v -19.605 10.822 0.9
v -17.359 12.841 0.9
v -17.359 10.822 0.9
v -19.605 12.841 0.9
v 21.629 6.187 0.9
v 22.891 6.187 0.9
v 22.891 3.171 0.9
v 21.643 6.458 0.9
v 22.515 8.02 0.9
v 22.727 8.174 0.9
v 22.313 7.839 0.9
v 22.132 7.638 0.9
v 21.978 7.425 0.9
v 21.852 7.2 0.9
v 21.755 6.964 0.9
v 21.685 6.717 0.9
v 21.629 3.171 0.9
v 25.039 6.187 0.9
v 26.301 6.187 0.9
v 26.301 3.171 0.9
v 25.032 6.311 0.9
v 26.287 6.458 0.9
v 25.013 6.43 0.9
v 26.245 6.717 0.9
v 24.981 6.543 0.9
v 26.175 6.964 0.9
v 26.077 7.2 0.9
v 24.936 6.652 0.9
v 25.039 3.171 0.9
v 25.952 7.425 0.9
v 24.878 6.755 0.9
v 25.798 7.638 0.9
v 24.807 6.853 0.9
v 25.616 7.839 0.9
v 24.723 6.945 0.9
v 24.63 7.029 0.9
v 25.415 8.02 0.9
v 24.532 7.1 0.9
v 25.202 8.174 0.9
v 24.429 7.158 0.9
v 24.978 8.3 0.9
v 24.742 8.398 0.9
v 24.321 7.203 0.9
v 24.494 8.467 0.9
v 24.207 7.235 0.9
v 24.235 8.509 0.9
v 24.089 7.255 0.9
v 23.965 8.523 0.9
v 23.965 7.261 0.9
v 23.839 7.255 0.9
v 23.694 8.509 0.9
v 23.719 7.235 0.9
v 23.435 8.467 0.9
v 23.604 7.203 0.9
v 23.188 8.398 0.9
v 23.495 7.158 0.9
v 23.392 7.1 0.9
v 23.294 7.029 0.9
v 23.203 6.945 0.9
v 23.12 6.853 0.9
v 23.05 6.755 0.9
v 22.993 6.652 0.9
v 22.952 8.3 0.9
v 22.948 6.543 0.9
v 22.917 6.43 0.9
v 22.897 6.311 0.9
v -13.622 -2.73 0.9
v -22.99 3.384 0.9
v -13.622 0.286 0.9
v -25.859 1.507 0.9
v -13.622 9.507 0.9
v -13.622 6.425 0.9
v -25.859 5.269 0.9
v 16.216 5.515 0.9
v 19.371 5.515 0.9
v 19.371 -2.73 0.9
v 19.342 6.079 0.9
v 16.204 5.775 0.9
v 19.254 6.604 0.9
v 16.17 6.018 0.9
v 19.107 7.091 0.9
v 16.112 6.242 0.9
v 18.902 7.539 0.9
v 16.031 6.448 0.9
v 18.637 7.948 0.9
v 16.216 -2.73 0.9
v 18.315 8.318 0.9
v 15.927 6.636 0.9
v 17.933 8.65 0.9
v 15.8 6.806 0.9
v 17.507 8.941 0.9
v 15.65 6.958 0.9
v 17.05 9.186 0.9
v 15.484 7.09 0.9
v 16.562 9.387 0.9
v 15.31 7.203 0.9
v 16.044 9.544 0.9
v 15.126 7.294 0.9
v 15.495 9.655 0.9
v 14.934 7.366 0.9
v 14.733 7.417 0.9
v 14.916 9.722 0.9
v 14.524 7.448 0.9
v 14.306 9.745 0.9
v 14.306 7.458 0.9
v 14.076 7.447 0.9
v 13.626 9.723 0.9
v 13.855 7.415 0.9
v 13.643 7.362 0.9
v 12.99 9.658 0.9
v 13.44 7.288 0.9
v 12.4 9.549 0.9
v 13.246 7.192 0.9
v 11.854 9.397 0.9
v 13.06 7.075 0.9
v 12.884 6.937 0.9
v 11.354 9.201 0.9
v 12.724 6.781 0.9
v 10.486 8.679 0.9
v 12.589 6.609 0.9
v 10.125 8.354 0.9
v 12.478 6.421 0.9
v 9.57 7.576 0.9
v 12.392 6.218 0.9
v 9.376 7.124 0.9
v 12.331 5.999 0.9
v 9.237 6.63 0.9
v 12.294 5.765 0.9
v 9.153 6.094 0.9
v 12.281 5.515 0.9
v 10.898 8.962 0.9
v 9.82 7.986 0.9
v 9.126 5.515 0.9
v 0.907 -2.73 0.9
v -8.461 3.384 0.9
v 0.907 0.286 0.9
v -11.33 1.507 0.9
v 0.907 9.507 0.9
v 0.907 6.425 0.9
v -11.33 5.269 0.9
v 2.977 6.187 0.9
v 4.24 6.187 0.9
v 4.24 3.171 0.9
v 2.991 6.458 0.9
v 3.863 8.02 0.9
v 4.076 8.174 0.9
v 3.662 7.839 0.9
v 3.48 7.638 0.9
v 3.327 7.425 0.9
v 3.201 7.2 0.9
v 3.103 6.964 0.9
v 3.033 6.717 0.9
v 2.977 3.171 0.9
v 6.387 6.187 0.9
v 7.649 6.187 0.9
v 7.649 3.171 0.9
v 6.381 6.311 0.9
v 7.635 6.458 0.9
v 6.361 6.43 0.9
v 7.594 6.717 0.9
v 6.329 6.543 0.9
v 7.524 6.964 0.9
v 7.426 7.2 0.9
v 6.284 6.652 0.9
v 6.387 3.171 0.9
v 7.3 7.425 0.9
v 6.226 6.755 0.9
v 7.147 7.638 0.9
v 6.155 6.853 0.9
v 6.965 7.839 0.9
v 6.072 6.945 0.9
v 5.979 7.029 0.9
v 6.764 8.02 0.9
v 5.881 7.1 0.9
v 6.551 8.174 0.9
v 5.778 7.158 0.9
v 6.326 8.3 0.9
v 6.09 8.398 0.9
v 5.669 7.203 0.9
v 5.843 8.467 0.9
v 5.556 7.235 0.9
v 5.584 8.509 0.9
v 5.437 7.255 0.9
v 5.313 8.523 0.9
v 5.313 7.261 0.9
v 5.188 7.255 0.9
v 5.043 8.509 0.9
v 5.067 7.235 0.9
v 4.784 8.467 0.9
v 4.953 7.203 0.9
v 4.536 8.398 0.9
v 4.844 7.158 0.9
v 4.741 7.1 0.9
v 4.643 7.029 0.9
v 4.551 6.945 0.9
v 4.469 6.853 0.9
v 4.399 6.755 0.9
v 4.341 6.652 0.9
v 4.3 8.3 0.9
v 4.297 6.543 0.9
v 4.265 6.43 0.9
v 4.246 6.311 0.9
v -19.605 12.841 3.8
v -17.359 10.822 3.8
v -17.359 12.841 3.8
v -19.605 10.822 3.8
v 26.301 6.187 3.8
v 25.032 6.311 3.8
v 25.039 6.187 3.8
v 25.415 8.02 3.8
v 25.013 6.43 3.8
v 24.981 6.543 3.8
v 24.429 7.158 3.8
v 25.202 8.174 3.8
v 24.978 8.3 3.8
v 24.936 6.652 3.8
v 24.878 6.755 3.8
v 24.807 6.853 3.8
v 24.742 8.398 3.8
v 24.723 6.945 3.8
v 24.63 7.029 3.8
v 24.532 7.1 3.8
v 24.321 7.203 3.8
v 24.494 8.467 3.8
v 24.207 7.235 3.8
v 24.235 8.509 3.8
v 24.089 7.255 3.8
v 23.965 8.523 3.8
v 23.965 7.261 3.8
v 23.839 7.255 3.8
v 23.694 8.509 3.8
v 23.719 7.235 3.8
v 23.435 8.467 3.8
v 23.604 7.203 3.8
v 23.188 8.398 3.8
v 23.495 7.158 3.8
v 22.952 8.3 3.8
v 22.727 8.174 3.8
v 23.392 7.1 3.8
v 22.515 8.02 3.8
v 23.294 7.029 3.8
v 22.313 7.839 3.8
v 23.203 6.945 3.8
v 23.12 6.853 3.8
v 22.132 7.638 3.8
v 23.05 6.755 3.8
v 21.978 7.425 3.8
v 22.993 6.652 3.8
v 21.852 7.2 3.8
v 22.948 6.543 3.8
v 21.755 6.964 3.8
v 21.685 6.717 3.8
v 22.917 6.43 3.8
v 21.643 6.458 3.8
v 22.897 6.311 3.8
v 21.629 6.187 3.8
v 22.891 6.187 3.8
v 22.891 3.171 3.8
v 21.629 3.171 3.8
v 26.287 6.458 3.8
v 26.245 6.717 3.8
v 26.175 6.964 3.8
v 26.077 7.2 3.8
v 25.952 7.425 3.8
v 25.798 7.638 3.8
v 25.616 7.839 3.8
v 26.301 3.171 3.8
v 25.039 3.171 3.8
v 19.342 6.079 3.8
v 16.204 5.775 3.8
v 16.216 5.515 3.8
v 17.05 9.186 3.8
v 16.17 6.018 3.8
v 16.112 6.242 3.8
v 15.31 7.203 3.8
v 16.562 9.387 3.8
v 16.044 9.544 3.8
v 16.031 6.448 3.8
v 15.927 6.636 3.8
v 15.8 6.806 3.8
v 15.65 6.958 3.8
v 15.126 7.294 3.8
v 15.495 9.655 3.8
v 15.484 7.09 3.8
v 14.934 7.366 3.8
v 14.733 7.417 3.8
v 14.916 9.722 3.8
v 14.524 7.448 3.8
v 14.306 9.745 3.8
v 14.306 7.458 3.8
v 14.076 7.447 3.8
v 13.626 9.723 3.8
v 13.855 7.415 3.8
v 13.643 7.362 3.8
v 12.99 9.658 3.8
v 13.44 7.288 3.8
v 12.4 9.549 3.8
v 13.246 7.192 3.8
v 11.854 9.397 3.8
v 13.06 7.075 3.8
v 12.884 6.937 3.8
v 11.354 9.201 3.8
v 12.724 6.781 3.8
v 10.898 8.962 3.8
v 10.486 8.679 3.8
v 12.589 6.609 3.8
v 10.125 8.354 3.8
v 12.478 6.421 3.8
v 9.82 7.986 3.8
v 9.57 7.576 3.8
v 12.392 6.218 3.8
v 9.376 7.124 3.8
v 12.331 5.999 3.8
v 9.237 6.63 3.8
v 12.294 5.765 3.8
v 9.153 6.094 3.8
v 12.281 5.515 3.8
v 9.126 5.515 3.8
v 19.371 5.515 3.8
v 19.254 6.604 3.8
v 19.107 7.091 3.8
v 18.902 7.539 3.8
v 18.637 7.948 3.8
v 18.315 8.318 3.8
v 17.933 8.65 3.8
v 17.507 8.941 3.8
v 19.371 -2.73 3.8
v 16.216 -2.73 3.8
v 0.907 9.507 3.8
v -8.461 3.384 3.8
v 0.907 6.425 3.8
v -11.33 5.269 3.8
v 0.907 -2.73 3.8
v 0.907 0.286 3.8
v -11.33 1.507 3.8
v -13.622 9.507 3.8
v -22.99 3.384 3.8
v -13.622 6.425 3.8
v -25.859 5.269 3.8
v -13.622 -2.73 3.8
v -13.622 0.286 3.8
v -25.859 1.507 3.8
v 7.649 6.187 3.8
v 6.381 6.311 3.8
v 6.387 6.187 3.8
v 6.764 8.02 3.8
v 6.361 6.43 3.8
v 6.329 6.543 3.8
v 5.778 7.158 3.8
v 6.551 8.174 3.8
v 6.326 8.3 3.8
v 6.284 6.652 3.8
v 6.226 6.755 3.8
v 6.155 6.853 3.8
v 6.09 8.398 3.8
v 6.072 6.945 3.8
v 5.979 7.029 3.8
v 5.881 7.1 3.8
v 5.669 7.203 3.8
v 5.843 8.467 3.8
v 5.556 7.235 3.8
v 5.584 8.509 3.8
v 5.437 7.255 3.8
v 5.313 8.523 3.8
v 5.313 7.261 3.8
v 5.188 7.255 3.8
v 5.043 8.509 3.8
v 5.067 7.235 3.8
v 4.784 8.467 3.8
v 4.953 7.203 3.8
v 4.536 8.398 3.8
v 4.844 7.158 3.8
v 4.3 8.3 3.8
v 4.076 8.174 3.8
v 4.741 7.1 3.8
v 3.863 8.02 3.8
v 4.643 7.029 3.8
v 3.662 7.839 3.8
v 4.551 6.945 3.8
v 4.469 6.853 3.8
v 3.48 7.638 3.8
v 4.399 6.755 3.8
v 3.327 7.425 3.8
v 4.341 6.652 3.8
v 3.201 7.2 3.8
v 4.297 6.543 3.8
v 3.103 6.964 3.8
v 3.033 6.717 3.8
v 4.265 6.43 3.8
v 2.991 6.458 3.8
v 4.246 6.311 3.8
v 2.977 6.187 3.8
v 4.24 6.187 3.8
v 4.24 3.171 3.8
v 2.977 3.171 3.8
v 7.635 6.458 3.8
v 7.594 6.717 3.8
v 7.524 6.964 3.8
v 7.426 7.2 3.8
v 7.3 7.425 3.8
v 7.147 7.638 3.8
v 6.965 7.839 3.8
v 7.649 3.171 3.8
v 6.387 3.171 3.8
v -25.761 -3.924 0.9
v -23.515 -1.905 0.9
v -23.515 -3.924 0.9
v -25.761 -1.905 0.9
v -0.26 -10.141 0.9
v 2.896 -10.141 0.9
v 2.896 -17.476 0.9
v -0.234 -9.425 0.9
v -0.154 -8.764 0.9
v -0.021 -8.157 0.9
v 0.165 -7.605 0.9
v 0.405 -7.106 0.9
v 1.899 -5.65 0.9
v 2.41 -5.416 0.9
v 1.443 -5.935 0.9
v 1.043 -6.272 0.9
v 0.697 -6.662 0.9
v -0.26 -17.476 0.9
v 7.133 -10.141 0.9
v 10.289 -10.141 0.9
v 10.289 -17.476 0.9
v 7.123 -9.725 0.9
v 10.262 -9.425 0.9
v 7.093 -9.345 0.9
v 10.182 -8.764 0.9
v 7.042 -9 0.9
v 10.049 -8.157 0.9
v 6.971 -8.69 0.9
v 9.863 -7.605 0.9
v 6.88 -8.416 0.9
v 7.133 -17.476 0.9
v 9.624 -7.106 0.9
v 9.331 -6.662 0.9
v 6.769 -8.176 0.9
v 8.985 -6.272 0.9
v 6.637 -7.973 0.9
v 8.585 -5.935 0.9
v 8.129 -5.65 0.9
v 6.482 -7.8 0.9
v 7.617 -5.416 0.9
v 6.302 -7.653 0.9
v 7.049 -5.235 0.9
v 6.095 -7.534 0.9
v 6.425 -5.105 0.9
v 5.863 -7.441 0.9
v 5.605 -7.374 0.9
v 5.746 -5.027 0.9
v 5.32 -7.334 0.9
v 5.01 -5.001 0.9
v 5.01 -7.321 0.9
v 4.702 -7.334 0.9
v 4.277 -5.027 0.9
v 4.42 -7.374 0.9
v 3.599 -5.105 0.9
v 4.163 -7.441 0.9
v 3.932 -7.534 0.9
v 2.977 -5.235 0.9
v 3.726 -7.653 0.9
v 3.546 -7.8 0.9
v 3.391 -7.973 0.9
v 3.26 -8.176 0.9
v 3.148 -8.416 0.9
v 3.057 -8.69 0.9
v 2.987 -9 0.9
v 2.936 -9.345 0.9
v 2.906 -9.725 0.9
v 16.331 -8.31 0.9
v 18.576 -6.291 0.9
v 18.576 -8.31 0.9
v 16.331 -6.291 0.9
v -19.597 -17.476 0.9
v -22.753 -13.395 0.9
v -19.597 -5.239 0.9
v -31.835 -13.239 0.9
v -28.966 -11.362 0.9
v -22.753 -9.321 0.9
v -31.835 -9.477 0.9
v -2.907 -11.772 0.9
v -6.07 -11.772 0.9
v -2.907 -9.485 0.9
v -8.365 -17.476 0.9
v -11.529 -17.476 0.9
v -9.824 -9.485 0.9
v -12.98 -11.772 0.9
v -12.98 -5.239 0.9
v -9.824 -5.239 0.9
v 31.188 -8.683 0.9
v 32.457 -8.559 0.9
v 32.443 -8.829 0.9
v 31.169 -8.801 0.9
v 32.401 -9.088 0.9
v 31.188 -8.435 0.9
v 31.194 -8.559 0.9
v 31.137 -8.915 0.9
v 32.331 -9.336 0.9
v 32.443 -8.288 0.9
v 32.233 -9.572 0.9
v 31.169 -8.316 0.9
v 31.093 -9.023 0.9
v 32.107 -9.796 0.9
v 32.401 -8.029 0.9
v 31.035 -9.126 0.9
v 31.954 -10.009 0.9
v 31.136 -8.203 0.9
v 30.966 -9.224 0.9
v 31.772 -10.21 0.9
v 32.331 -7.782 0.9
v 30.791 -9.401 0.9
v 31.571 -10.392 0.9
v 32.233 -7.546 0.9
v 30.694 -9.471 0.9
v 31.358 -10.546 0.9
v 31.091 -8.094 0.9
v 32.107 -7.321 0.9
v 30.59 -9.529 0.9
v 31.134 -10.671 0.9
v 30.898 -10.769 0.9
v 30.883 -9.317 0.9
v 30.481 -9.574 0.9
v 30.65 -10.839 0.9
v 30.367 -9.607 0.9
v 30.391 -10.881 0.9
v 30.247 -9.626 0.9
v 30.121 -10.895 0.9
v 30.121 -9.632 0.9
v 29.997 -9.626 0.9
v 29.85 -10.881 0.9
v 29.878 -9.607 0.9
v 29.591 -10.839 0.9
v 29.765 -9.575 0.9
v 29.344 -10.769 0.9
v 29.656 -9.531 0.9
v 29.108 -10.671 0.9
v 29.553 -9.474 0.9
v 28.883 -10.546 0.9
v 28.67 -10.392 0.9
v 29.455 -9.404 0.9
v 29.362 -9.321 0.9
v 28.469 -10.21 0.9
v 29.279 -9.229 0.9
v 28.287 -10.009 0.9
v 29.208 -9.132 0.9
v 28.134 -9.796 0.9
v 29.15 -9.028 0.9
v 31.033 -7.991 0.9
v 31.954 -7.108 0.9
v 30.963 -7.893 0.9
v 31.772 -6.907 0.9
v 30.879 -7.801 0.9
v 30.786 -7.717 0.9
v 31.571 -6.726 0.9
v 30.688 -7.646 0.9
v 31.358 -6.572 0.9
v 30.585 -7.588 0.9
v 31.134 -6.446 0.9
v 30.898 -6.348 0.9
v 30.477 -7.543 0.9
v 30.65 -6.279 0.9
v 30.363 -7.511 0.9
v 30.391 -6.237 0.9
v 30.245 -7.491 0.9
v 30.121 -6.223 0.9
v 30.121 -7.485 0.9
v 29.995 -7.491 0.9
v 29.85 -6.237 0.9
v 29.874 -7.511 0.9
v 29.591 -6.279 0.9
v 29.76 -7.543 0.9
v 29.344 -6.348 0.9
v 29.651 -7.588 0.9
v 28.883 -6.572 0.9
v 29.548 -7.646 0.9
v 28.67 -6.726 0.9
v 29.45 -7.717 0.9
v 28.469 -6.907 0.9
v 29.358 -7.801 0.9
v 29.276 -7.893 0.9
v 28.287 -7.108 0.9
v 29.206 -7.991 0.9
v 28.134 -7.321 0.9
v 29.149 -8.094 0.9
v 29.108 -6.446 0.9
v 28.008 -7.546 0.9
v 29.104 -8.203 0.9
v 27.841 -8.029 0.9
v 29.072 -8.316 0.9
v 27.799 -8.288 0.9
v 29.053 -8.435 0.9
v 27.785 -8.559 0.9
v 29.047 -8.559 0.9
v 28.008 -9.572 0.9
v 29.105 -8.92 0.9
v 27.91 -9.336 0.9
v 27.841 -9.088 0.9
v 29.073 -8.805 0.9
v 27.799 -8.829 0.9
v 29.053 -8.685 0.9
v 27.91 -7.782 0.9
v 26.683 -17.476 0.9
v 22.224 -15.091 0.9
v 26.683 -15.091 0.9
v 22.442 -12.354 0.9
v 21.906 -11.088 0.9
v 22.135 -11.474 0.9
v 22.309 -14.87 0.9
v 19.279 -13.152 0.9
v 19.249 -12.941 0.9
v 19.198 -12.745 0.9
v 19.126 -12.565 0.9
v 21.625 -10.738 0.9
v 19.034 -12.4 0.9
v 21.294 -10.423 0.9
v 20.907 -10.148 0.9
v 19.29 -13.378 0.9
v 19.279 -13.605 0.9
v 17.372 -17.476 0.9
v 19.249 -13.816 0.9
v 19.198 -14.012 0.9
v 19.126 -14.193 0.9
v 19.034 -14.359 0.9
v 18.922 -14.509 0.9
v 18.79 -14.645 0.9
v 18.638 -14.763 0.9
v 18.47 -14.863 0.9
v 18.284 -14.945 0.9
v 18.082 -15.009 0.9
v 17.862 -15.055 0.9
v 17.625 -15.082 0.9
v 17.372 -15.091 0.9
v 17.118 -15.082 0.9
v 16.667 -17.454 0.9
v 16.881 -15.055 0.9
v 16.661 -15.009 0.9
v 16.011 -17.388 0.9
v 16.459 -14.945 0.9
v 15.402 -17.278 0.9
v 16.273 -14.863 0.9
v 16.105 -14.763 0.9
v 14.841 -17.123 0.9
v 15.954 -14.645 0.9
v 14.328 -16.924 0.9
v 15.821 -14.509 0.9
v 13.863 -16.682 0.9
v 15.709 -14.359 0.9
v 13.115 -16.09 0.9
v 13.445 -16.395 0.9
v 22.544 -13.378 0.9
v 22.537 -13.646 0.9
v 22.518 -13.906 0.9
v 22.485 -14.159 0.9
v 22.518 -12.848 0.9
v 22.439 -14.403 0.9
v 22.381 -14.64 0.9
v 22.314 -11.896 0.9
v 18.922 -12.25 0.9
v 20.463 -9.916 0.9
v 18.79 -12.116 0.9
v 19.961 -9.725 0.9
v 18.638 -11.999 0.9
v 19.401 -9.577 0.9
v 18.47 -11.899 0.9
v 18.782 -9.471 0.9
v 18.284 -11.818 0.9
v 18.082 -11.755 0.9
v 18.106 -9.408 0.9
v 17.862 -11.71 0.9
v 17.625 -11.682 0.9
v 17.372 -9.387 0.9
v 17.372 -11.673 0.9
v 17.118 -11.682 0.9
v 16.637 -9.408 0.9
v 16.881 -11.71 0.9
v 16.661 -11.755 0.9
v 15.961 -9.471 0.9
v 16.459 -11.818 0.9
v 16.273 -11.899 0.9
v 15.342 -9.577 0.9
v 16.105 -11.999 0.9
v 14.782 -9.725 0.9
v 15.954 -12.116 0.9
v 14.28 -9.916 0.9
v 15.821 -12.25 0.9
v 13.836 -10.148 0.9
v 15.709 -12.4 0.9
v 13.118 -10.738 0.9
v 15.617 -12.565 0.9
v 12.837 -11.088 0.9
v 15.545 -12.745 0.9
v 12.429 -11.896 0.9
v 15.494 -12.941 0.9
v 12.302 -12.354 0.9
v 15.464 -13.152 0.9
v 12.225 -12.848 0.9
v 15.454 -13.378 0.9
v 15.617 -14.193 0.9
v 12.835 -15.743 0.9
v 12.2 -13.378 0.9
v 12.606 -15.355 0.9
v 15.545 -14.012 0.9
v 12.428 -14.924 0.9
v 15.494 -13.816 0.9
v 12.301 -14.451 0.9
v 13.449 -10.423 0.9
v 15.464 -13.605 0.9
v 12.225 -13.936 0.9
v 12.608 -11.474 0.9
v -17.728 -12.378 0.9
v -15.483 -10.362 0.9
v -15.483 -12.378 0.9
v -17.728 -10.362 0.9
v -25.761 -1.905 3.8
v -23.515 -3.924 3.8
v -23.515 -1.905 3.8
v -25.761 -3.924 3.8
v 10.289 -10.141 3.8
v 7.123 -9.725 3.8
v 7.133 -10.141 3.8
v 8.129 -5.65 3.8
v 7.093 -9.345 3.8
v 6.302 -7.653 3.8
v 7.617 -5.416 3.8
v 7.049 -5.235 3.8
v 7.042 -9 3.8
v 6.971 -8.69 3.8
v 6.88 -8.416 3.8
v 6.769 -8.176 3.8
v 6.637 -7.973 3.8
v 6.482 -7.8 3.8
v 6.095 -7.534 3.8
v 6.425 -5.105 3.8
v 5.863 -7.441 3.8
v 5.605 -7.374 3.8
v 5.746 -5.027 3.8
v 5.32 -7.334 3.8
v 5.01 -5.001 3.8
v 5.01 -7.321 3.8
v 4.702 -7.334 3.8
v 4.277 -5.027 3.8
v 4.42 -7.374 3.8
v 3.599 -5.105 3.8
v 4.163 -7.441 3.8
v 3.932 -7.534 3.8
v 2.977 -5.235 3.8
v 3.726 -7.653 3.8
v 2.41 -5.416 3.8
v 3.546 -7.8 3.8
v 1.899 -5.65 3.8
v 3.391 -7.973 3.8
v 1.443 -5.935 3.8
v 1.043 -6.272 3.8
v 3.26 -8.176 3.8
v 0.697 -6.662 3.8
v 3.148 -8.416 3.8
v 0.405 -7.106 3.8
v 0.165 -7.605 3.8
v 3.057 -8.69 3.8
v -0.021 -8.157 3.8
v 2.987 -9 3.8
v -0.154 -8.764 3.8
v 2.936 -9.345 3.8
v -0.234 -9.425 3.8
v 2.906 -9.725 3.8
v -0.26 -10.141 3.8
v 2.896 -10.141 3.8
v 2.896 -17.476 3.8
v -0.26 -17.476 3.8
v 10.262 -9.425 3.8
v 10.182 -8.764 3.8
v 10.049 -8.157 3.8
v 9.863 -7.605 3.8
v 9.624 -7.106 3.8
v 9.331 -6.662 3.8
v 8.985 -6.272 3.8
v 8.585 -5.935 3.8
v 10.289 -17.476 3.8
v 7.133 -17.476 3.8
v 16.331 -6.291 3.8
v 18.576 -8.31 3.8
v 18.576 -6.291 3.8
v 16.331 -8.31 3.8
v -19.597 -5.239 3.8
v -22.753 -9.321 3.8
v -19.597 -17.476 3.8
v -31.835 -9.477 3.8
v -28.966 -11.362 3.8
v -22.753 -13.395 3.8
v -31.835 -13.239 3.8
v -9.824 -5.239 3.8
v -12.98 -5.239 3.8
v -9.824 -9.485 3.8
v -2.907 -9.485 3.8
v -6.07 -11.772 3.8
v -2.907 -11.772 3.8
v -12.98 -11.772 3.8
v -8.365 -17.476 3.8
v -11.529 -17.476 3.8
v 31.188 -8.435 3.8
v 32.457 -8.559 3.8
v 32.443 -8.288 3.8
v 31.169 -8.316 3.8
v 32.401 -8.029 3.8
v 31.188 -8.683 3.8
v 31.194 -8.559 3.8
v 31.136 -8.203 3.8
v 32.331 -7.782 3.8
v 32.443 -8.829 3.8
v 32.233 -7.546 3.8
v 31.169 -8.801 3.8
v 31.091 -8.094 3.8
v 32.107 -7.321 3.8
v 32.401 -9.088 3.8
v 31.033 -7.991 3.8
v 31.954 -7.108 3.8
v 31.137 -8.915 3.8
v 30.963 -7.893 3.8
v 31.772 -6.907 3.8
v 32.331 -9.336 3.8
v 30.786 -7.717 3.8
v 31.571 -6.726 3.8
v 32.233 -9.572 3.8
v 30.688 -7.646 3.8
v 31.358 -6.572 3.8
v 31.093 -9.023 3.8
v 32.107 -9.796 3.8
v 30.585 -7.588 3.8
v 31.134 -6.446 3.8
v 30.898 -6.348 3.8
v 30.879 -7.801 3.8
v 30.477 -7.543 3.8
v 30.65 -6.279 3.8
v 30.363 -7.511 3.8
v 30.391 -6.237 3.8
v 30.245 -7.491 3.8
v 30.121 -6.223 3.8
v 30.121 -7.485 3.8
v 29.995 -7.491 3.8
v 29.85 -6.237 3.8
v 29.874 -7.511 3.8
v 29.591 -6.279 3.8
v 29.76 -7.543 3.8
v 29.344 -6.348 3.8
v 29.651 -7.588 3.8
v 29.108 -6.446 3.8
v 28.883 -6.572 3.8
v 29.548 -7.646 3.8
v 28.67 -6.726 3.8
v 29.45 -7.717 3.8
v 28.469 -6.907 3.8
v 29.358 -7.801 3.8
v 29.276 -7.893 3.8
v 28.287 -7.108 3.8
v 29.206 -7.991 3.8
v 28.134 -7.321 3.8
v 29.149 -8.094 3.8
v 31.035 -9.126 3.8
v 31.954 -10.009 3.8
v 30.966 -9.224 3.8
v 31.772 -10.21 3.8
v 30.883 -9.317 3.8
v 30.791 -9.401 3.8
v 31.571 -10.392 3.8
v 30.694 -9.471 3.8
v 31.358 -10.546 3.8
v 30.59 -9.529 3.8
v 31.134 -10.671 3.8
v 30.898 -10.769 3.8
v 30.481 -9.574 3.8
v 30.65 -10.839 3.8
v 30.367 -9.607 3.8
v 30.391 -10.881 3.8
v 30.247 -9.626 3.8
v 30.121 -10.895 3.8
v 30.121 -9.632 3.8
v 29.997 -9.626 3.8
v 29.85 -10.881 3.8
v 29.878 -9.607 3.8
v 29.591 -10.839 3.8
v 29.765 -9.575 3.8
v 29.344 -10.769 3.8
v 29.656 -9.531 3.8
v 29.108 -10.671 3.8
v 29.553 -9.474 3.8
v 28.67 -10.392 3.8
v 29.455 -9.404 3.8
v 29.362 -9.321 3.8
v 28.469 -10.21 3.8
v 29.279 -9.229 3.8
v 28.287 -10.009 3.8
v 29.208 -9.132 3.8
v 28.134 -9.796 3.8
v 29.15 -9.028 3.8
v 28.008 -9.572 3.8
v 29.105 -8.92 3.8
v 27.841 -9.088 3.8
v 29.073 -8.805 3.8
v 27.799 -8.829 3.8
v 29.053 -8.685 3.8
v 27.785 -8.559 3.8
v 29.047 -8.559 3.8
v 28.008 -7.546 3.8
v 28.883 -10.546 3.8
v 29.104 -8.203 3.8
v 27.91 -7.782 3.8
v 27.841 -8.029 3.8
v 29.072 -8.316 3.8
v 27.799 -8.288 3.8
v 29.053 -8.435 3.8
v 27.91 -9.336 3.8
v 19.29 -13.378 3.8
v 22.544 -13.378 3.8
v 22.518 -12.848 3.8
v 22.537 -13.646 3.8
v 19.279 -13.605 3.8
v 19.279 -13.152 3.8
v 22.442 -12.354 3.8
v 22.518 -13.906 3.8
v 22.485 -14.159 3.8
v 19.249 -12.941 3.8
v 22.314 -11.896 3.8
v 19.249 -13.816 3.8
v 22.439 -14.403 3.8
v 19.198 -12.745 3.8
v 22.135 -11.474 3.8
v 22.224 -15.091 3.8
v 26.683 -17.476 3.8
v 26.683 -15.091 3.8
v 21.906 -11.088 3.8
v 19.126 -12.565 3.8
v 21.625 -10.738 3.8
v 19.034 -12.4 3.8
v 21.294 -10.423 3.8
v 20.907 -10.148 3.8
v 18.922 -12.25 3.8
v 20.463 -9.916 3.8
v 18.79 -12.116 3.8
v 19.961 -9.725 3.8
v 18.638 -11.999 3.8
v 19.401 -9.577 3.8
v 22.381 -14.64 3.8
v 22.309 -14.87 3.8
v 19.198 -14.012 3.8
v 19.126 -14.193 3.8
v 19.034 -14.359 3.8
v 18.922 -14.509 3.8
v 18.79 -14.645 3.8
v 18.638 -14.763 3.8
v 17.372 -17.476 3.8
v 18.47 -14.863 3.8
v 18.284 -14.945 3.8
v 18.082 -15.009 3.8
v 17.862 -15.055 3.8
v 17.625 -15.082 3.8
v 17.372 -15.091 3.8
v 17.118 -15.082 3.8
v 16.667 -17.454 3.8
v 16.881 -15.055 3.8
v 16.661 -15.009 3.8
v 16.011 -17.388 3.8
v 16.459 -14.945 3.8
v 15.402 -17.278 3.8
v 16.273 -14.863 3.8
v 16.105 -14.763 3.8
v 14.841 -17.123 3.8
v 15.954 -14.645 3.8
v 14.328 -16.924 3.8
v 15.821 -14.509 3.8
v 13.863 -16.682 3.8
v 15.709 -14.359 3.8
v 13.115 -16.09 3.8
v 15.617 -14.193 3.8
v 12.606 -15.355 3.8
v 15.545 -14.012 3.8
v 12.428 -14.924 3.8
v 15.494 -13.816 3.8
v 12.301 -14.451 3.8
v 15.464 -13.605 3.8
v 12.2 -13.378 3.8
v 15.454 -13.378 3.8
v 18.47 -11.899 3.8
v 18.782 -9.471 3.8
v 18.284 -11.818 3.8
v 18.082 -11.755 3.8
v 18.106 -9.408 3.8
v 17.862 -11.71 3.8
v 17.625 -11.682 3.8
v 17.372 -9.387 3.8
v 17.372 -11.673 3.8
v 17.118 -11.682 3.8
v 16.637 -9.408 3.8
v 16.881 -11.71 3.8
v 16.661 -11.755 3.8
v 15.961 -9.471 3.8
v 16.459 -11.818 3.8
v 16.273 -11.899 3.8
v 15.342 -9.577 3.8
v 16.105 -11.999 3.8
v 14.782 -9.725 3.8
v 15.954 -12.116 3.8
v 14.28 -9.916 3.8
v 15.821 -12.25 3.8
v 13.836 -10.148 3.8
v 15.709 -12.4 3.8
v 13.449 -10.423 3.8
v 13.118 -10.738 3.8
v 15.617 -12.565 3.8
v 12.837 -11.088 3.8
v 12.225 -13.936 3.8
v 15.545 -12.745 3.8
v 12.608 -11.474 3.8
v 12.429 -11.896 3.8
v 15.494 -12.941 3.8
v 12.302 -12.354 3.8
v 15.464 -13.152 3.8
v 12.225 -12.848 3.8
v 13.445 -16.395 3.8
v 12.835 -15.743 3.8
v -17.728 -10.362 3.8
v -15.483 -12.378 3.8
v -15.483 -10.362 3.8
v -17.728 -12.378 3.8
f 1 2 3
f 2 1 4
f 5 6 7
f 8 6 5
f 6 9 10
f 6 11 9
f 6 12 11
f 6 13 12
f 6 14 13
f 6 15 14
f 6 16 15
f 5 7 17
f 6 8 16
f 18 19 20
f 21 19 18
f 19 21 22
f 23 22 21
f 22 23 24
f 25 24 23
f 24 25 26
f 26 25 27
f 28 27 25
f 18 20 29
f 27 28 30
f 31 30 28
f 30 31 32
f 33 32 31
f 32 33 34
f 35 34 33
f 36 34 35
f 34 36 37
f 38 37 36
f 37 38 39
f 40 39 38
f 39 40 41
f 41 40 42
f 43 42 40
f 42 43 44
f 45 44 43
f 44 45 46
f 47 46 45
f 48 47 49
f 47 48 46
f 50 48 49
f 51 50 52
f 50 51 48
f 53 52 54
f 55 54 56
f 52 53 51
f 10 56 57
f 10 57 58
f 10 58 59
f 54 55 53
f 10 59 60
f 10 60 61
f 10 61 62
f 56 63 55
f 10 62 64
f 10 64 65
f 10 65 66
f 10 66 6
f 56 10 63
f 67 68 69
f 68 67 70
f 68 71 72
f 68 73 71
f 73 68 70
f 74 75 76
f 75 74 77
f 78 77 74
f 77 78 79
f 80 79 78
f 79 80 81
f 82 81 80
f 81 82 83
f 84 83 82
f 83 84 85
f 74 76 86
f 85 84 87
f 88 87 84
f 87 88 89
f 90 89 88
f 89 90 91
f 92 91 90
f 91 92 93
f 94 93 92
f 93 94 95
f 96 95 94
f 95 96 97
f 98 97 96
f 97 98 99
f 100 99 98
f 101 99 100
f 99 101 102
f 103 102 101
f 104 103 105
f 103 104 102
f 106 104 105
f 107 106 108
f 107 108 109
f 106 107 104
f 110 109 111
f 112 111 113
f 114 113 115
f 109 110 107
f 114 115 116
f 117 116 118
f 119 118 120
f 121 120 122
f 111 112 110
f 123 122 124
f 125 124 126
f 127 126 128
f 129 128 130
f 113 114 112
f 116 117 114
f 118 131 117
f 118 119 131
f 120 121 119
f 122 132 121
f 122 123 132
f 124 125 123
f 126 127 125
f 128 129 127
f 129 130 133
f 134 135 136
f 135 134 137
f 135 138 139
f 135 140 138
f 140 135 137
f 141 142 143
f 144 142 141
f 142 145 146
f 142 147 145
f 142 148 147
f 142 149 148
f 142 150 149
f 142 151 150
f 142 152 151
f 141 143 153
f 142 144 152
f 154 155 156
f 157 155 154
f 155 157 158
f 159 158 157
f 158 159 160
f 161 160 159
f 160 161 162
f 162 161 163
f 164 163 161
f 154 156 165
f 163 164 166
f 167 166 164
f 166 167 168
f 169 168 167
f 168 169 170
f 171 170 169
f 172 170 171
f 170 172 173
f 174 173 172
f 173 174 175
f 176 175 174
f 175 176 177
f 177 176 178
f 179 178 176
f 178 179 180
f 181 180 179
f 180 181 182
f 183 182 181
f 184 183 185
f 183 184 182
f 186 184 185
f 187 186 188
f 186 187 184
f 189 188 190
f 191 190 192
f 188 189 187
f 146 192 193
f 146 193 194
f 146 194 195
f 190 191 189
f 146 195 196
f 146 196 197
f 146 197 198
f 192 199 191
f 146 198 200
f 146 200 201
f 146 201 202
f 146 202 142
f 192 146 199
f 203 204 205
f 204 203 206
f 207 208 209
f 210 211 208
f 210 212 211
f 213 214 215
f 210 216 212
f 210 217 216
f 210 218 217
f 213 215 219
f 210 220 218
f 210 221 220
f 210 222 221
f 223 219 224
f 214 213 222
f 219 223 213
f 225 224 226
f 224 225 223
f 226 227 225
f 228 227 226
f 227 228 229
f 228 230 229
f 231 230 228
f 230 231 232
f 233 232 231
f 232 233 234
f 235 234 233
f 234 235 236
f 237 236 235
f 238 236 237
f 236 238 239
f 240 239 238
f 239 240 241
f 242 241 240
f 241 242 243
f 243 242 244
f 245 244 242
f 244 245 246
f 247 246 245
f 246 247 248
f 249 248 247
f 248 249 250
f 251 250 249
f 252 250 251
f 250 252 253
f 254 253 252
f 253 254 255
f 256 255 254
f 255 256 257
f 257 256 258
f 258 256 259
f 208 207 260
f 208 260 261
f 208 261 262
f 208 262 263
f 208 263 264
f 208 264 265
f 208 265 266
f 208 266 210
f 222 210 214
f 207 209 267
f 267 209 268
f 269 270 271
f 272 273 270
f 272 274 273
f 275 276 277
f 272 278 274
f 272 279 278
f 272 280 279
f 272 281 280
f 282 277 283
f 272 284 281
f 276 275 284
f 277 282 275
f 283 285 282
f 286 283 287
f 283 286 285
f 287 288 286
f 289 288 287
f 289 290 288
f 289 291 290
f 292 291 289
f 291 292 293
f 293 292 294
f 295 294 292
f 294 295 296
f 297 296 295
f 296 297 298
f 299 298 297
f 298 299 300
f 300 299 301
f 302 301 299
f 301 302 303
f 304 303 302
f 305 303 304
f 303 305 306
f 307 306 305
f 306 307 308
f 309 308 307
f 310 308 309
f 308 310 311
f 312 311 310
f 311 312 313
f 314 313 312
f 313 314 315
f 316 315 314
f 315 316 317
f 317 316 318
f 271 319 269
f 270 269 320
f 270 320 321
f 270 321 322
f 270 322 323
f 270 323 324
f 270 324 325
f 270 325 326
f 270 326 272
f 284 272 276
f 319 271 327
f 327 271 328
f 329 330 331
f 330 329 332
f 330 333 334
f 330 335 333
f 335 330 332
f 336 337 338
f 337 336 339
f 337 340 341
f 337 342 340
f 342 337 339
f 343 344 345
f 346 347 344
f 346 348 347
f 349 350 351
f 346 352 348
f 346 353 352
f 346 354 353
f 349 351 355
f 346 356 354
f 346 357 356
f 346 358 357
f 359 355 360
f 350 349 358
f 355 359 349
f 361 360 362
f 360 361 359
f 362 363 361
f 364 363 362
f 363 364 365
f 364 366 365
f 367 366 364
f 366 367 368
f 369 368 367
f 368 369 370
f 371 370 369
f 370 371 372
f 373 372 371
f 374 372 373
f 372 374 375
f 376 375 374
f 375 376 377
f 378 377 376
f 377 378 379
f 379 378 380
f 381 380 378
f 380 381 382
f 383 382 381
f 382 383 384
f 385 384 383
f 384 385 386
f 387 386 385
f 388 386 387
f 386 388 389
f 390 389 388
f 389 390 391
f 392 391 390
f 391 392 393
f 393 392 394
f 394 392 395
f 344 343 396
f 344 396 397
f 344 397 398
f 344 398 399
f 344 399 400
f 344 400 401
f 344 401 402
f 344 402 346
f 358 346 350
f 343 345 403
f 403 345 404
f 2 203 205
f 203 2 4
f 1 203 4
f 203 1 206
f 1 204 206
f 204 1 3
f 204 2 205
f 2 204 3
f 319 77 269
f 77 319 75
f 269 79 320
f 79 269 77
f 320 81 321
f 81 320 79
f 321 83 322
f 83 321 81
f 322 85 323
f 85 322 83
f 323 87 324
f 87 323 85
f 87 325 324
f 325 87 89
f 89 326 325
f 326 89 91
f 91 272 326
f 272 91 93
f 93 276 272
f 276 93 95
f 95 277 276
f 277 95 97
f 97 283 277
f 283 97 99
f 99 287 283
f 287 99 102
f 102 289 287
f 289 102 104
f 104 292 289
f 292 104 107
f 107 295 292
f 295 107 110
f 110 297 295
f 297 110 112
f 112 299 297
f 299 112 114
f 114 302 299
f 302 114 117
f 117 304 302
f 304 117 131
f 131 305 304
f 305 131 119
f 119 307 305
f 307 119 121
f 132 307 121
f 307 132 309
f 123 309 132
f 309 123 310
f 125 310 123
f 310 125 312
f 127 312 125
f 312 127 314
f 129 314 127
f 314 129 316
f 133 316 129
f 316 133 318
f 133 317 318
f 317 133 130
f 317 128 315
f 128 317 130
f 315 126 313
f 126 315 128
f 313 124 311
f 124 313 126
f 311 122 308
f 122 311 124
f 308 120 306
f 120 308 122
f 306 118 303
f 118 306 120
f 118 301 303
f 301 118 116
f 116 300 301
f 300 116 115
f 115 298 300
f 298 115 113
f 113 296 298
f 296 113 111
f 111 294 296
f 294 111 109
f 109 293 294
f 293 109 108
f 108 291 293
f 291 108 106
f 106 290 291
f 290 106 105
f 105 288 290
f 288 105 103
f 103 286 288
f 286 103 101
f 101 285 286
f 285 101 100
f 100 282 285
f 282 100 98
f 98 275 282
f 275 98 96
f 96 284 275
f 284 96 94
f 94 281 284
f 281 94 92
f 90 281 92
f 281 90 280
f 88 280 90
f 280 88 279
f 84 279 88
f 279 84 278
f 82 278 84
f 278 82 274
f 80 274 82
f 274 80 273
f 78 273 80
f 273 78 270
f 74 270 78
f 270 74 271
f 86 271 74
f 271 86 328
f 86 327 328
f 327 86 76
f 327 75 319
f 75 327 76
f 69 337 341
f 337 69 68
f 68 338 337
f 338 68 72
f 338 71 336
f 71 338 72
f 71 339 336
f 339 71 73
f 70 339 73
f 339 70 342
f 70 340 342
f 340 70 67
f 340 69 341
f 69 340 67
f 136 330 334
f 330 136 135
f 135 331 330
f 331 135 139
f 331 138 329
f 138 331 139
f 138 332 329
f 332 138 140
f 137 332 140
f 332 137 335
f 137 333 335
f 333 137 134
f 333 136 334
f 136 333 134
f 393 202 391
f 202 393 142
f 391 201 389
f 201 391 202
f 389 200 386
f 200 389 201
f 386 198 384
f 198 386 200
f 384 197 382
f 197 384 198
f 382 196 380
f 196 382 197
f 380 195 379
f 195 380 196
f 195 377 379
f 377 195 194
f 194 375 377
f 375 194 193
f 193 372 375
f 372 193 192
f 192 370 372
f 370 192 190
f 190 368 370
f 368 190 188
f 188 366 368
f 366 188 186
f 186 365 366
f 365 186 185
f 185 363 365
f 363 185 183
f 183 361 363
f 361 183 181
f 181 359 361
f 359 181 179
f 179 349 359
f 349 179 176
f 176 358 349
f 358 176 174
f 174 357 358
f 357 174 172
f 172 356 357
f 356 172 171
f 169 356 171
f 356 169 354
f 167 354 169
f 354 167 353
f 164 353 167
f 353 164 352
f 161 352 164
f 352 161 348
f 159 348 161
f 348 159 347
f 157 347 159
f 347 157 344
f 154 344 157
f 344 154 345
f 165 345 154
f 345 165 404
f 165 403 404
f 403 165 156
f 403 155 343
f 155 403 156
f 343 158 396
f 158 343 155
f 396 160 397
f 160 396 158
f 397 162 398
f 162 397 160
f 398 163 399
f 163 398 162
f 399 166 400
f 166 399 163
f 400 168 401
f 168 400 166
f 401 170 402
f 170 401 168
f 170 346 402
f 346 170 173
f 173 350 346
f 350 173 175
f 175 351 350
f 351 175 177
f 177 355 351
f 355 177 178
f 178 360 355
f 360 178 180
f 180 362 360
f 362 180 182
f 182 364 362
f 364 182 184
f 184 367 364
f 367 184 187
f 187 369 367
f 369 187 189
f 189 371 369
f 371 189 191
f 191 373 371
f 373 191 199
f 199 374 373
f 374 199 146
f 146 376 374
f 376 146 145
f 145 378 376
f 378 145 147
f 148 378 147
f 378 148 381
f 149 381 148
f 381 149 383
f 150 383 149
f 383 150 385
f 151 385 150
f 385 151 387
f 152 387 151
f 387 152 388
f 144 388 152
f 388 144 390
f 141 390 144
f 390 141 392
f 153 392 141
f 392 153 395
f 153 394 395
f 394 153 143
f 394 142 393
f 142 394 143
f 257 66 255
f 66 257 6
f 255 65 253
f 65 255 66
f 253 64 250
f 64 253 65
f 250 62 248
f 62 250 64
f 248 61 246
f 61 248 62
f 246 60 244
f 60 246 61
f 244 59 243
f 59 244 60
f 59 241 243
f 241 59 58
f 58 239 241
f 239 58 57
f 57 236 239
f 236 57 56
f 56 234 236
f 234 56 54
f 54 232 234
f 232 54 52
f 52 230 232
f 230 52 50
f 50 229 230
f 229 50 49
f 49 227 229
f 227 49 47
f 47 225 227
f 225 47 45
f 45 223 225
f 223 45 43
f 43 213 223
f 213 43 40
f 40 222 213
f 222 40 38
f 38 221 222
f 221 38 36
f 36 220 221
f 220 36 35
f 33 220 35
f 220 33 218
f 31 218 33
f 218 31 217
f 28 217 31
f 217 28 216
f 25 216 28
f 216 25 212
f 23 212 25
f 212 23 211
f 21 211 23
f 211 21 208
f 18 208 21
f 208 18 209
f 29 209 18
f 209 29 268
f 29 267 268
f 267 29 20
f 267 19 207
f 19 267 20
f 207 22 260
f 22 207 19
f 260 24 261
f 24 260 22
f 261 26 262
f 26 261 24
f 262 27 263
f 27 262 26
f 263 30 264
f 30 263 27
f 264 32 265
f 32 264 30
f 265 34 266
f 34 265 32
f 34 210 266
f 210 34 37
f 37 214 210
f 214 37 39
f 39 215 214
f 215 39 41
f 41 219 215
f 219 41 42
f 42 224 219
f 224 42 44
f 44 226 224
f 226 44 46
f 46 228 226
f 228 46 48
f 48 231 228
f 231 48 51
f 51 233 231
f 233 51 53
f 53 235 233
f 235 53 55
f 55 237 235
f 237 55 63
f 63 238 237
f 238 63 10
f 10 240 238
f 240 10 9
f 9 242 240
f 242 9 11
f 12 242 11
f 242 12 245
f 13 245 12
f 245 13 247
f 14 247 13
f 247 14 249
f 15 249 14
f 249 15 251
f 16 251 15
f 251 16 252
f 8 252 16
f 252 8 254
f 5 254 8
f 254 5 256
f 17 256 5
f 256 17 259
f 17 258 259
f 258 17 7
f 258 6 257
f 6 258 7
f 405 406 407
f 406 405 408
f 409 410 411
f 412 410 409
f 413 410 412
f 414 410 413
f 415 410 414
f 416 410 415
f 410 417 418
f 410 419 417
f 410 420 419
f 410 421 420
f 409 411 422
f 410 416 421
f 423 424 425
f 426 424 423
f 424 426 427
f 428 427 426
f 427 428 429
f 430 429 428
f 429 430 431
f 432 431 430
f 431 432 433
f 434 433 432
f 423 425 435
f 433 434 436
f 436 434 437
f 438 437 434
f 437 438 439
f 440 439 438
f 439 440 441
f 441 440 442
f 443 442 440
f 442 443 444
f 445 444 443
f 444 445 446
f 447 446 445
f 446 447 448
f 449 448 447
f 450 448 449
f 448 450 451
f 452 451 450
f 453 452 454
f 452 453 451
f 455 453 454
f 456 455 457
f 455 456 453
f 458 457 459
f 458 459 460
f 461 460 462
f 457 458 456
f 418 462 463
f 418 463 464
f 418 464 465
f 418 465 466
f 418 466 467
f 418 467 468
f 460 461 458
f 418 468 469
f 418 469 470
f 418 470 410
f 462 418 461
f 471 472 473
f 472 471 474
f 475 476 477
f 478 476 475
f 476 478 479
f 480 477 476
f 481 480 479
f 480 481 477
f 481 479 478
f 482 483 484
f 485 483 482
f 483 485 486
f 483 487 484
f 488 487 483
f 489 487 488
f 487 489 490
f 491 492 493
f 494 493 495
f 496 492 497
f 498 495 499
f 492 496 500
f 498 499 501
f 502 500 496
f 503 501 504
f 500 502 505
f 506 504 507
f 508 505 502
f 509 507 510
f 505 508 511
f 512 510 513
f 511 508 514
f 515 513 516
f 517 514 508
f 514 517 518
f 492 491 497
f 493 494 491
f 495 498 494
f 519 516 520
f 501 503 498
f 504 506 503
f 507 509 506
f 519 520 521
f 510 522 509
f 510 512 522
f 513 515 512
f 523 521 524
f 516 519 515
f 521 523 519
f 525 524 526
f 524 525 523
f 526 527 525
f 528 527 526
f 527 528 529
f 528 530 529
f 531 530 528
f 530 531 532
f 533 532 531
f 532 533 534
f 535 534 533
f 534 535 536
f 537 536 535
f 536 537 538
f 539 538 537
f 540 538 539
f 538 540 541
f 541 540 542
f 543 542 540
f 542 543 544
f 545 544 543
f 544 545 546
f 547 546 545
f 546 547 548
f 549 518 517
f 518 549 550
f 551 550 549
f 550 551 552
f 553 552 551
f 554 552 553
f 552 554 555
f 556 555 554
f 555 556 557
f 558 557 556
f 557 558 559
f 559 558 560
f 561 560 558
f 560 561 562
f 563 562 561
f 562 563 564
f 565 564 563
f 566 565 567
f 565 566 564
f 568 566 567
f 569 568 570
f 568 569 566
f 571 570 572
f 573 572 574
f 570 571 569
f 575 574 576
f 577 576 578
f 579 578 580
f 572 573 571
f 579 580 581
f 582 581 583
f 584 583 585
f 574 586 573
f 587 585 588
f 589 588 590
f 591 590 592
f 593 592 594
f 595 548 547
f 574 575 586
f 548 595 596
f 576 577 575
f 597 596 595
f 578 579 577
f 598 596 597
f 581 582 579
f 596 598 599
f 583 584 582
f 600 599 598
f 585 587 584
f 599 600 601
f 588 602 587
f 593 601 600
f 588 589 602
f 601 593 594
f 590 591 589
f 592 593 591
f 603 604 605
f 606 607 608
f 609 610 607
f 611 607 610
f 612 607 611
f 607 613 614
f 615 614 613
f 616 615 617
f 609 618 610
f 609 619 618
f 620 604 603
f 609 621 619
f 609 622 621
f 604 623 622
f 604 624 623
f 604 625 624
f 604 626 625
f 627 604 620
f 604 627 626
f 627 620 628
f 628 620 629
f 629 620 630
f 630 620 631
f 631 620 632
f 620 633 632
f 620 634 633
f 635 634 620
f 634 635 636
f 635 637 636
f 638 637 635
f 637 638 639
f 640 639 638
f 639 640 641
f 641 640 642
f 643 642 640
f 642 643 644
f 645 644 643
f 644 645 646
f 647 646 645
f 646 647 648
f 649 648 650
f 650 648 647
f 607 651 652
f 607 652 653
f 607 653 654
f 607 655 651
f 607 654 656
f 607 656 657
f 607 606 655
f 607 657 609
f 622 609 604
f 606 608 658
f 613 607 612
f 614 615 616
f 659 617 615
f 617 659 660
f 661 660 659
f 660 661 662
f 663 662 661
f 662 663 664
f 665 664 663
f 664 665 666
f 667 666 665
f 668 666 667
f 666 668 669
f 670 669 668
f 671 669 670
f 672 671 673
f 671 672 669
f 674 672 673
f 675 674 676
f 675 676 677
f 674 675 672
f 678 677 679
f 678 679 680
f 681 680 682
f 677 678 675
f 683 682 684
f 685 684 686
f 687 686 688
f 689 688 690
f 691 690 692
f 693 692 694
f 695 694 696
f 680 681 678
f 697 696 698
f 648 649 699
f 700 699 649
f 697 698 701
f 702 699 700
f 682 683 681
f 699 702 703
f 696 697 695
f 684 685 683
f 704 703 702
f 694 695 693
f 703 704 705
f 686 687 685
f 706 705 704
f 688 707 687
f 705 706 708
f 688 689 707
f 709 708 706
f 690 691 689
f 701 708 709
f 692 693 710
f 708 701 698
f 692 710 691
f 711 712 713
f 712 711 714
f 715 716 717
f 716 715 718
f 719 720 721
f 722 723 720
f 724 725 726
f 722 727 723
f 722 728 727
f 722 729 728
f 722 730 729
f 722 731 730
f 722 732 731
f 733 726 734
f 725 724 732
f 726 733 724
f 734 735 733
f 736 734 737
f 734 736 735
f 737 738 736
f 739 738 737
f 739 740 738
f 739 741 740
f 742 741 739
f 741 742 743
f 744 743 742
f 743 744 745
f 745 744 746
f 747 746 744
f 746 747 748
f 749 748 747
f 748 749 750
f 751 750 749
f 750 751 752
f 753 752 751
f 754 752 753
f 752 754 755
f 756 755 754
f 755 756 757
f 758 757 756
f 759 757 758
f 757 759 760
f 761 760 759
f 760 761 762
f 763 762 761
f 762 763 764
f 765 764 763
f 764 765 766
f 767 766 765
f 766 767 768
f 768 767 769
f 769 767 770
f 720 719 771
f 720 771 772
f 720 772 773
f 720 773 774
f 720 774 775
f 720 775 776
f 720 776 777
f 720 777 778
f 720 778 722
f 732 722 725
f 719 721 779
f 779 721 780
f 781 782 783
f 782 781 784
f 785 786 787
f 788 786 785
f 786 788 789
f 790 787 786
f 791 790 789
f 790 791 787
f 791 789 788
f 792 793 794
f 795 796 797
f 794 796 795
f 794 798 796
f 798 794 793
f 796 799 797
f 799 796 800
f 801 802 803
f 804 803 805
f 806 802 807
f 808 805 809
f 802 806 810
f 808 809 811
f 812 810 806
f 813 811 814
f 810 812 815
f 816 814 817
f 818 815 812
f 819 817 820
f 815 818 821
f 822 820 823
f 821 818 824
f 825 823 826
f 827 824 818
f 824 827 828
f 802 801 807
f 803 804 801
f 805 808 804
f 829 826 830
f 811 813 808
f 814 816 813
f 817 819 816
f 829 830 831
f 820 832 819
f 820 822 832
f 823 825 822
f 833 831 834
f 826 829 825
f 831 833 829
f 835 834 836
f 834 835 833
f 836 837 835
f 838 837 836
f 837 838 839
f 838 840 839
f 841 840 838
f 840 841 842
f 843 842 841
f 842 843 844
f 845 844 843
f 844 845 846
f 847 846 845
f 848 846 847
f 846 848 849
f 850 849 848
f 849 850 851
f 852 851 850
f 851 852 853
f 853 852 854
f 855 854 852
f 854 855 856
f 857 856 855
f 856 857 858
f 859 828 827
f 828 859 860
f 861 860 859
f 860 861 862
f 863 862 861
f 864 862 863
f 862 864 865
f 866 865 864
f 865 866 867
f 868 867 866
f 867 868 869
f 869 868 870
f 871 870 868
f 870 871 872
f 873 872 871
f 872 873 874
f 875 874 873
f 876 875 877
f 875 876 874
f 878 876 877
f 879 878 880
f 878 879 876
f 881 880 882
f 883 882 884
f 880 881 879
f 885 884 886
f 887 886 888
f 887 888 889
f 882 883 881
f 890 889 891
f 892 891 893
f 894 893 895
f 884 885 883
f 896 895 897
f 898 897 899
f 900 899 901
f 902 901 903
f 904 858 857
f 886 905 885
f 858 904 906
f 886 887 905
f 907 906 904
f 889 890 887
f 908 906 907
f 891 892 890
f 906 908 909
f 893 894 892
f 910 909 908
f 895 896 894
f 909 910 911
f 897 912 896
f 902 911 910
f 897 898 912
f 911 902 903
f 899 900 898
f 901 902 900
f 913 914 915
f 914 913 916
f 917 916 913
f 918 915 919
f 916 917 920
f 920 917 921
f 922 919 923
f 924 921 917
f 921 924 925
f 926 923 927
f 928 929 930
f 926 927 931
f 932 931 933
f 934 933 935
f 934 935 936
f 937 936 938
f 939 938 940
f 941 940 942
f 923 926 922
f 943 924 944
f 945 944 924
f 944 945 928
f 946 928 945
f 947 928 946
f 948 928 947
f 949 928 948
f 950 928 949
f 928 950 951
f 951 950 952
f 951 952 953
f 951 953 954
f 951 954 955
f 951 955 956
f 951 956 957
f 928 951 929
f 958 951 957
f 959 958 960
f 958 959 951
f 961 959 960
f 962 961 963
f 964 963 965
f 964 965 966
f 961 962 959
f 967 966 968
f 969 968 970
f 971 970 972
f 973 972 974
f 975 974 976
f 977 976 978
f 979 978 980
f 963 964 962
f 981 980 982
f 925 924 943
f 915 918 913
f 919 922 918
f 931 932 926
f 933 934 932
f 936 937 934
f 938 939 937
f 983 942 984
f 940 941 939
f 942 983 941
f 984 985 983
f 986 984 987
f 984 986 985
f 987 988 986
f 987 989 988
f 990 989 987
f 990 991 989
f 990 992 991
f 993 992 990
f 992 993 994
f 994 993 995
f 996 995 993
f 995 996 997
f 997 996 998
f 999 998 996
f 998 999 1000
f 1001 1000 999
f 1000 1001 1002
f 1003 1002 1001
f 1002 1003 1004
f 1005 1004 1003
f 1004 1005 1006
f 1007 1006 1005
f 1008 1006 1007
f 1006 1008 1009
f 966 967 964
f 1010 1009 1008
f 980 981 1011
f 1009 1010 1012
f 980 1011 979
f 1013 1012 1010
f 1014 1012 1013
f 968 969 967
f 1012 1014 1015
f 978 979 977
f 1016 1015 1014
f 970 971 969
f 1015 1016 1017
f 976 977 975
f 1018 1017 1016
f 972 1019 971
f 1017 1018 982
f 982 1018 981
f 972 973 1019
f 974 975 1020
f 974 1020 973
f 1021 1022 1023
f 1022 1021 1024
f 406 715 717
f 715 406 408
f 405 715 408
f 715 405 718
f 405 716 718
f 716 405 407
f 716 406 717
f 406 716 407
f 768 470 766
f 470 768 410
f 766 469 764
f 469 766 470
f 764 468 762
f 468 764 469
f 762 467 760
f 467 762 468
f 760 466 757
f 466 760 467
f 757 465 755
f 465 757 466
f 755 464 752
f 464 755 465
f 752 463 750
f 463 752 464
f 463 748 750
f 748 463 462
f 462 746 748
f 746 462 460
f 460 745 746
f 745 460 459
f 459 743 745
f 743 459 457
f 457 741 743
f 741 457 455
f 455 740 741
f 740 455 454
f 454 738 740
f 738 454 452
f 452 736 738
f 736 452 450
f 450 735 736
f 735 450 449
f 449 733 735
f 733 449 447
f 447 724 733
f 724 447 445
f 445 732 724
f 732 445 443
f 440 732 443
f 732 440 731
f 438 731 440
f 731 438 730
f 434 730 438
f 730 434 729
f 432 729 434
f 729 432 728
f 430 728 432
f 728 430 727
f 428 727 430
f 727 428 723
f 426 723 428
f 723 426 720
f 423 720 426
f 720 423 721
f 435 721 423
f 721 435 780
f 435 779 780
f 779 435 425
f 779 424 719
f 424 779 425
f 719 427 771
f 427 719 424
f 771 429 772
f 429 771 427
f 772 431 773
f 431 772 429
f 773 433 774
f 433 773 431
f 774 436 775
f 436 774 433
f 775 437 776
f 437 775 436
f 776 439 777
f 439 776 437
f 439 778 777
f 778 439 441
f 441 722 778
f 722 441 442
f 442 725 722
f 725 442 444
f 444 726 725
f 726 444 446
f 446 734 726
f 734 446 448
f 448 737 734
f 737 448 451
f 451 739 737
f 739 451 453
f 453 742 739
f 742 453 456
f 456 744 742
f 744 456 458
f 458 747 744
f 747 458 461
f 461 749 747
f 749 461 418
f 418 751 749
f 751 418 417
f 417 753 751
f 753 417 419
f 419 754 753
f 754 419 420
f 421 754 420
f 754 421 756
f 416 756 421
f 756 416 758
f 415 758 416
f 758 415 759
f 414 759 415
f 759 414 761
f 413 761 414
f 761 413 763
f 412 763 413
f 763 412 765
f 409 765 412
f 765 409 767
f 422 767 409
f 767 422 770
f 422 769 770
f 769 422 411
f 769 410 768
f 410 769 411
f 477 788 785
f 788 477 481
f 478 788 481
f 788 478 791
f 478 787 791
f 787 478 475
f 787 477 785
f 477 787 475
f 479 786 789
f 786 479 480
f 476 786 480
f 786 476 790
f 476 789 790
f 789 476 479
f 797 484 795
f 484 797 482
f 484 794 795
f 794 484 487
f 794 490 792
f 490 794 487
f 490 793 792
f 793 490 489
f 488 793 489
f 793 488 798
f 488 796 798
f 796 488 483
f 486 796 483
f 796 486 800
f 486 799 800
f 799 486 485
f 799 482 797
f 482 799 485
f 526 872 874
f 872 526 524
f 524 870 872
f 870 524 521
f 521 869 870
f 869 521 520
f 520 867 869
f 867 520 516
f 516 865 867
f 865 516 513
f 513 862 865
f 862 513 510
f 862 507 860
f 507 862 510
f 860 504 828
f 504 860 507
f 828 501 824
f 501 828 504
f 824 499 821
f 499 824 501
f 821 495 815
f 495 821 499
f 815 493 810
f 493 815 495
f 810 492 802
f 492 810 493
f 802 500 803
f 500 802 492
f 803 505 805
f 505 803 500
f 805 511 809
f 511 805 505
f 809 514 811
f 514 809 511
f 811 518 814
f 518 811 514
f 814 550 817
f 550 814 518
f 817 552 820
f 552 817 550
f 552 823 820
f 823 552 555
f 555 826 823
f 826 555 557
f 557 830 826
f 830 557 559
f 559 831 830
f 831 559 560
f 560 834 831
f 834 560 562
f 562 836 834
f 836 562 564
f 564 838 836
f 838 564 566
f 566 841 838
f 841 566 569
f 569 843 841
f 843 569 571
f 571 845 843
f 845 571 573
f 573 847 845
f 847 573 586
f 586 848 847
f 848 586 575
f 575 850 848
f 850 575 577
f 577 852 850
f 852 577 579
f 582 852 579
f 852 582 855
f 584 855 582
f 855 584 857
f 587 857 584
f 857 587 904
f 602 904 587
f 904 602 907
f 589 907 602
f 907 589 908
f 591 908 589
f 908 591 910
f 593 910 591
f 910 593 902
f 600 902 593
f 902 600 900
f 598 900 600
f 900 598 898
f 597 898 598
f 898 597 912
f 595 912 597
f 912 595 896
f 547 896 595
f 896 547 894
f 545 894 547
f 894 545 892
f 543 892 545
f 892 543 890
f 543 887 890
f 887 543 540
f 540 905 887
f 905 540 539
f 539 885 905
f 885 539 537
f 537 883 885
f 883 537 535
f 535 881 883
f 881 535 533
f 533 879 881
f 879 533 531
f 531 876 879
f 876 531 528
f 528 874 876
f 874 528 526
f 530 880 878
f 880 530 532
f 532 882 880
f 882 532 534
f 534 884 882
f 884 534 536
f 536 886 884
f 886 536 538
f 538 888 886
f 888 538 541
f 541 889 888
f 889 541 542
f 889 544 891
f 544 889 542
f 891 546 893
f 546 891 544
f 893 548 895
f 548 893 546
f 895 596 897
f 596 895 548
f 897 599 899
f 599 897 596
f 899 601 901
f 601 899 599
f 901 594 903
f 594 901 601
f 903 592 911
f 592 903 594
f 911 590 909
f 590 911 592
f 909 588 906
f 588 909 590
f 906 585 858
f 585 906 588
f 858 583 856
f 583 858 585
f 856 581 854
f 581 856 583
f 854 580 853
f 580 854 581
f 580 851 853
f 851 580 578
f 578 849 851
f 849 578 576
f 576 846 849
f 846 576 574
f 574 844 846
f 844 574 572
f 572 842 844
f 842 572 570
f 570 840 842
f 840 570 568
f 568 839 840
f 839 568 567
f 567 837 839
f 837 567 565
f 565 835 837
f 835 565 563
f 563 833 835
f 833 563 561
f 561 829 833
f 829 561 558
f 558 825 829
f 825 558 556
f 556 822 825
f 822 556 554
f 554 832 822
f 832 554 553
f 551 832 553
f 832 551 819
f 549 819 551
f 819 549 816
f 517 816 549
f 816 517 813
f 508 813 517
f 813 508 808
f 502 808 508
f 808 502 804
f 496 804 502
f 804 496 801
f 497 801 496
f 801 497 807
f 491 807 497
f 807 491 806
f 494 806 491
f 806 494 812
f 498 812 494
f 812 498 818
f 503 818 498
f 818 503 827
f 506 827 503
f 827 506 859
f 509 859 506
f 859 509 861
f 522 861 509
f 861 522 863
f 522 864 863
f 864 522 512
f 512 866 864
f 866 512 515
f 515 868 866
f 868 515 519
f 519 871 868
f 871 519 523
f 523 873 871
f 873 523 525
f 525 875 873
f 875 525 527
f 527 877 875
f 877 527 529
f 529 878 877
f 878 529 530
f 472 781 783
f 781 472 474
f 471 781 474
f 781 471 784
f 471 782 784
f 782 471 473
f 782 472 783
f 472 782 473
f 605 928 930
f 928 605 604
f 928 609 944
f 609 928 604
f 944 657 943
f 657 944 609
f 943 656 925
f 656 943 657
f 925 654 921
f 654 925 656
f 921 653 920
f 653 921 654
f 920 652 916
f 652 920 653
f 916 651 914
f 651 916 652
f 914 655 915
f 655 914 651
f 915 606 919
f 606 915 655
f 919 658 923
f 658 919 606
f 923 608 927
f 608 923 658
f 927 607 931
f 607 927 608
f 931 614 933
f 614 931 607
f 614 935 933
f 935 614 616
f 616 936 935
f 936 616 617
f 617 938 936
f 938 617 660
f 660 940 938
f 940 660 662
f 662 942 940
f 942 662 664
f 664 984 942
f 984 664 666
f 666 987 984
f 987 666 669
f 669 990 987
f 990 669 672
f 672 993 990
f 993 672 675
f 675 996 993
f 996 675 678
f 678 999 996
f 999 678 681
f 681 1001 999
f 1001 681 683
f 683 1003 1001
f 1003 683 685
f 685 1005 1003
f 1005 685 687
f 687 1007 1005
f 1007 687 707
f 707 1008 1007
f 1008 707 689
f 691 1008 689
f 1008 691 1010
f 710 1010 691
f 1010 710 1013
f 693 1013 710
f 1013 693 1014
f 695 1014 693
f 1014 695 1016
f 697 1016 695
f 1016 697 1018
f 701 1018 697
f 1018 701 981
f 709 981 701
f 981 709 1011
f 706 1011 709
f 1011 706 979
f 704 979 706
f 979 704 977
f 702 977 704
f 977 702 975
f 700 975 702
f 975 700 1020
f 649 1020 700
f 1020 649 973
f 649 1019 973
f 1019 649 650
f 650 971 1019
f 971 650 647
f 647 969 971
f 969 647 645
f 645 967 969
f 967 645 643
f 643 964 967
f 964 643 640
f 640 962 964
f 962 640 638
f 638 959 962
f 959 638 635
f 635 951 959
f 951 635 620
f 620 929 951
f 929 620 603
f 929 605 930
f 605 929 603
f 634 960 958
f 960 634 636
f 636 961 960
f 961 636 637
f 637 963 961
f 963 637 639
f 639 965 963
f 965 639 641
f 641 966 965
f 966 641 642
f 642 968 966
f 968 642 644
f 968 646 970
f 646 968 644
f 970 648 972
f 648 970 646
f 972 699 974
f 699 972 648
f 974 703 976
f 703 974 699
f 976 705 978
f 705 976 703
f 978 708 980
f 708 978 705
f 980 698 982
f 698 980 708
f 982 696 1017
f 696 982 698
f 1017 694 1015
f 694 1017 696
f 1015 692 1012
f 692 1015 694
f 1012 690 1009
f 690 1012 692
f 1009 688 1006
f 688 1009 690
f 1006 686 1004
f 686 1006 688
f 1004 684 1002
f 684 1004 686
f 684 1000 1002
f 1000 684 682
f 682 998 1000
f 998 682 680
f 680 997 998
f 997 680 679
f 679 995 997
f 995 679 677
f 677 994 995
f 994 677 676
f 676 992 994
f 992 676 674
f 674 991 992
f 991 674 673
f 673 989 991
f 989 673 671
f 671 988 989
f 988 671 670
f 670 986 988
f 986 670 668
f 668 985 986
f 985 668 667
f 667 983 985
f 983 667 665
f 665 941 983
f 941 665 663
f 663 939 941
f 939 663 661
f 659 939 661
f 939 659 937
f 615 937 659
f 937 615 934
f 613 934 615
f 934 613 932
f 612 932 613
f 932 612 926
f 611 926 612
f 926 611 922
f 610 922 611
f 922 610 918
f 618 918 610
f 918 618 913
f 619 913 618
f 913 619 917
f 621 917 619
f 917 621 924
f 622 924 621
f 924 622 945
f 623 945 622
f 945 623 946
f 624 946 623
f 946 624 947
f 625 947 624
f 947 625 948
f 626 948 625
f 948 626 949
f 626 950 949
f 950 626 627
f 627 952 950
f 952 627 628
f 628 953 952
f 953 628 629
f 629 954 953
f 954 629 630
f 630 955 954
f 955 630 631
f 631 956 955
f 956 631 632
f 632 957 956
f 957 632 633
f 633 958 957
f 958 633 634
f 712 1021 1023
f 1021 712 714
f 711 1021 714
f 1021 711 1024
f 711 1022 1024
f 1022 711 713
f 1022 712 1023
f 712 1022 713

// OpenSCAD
$fn = 48;
  // syllabics (overlaid on icon, tallest)
  translate([0, 4.873, 0.900]) linear_extrude(height=2.900) text("ᐹᐸᐢᒉᐢ", size=12.087, halign="center", valign="center", font="Euphemia UCAS:style=Bold");
  translate([0, -9.873, 0.900]) linear_extrude(height=2.900) text("ᐚᔭᑎᓈᐤ", size=12.087, halign="center", valign="center", font="Euphemia UCAS:style=Bold");
